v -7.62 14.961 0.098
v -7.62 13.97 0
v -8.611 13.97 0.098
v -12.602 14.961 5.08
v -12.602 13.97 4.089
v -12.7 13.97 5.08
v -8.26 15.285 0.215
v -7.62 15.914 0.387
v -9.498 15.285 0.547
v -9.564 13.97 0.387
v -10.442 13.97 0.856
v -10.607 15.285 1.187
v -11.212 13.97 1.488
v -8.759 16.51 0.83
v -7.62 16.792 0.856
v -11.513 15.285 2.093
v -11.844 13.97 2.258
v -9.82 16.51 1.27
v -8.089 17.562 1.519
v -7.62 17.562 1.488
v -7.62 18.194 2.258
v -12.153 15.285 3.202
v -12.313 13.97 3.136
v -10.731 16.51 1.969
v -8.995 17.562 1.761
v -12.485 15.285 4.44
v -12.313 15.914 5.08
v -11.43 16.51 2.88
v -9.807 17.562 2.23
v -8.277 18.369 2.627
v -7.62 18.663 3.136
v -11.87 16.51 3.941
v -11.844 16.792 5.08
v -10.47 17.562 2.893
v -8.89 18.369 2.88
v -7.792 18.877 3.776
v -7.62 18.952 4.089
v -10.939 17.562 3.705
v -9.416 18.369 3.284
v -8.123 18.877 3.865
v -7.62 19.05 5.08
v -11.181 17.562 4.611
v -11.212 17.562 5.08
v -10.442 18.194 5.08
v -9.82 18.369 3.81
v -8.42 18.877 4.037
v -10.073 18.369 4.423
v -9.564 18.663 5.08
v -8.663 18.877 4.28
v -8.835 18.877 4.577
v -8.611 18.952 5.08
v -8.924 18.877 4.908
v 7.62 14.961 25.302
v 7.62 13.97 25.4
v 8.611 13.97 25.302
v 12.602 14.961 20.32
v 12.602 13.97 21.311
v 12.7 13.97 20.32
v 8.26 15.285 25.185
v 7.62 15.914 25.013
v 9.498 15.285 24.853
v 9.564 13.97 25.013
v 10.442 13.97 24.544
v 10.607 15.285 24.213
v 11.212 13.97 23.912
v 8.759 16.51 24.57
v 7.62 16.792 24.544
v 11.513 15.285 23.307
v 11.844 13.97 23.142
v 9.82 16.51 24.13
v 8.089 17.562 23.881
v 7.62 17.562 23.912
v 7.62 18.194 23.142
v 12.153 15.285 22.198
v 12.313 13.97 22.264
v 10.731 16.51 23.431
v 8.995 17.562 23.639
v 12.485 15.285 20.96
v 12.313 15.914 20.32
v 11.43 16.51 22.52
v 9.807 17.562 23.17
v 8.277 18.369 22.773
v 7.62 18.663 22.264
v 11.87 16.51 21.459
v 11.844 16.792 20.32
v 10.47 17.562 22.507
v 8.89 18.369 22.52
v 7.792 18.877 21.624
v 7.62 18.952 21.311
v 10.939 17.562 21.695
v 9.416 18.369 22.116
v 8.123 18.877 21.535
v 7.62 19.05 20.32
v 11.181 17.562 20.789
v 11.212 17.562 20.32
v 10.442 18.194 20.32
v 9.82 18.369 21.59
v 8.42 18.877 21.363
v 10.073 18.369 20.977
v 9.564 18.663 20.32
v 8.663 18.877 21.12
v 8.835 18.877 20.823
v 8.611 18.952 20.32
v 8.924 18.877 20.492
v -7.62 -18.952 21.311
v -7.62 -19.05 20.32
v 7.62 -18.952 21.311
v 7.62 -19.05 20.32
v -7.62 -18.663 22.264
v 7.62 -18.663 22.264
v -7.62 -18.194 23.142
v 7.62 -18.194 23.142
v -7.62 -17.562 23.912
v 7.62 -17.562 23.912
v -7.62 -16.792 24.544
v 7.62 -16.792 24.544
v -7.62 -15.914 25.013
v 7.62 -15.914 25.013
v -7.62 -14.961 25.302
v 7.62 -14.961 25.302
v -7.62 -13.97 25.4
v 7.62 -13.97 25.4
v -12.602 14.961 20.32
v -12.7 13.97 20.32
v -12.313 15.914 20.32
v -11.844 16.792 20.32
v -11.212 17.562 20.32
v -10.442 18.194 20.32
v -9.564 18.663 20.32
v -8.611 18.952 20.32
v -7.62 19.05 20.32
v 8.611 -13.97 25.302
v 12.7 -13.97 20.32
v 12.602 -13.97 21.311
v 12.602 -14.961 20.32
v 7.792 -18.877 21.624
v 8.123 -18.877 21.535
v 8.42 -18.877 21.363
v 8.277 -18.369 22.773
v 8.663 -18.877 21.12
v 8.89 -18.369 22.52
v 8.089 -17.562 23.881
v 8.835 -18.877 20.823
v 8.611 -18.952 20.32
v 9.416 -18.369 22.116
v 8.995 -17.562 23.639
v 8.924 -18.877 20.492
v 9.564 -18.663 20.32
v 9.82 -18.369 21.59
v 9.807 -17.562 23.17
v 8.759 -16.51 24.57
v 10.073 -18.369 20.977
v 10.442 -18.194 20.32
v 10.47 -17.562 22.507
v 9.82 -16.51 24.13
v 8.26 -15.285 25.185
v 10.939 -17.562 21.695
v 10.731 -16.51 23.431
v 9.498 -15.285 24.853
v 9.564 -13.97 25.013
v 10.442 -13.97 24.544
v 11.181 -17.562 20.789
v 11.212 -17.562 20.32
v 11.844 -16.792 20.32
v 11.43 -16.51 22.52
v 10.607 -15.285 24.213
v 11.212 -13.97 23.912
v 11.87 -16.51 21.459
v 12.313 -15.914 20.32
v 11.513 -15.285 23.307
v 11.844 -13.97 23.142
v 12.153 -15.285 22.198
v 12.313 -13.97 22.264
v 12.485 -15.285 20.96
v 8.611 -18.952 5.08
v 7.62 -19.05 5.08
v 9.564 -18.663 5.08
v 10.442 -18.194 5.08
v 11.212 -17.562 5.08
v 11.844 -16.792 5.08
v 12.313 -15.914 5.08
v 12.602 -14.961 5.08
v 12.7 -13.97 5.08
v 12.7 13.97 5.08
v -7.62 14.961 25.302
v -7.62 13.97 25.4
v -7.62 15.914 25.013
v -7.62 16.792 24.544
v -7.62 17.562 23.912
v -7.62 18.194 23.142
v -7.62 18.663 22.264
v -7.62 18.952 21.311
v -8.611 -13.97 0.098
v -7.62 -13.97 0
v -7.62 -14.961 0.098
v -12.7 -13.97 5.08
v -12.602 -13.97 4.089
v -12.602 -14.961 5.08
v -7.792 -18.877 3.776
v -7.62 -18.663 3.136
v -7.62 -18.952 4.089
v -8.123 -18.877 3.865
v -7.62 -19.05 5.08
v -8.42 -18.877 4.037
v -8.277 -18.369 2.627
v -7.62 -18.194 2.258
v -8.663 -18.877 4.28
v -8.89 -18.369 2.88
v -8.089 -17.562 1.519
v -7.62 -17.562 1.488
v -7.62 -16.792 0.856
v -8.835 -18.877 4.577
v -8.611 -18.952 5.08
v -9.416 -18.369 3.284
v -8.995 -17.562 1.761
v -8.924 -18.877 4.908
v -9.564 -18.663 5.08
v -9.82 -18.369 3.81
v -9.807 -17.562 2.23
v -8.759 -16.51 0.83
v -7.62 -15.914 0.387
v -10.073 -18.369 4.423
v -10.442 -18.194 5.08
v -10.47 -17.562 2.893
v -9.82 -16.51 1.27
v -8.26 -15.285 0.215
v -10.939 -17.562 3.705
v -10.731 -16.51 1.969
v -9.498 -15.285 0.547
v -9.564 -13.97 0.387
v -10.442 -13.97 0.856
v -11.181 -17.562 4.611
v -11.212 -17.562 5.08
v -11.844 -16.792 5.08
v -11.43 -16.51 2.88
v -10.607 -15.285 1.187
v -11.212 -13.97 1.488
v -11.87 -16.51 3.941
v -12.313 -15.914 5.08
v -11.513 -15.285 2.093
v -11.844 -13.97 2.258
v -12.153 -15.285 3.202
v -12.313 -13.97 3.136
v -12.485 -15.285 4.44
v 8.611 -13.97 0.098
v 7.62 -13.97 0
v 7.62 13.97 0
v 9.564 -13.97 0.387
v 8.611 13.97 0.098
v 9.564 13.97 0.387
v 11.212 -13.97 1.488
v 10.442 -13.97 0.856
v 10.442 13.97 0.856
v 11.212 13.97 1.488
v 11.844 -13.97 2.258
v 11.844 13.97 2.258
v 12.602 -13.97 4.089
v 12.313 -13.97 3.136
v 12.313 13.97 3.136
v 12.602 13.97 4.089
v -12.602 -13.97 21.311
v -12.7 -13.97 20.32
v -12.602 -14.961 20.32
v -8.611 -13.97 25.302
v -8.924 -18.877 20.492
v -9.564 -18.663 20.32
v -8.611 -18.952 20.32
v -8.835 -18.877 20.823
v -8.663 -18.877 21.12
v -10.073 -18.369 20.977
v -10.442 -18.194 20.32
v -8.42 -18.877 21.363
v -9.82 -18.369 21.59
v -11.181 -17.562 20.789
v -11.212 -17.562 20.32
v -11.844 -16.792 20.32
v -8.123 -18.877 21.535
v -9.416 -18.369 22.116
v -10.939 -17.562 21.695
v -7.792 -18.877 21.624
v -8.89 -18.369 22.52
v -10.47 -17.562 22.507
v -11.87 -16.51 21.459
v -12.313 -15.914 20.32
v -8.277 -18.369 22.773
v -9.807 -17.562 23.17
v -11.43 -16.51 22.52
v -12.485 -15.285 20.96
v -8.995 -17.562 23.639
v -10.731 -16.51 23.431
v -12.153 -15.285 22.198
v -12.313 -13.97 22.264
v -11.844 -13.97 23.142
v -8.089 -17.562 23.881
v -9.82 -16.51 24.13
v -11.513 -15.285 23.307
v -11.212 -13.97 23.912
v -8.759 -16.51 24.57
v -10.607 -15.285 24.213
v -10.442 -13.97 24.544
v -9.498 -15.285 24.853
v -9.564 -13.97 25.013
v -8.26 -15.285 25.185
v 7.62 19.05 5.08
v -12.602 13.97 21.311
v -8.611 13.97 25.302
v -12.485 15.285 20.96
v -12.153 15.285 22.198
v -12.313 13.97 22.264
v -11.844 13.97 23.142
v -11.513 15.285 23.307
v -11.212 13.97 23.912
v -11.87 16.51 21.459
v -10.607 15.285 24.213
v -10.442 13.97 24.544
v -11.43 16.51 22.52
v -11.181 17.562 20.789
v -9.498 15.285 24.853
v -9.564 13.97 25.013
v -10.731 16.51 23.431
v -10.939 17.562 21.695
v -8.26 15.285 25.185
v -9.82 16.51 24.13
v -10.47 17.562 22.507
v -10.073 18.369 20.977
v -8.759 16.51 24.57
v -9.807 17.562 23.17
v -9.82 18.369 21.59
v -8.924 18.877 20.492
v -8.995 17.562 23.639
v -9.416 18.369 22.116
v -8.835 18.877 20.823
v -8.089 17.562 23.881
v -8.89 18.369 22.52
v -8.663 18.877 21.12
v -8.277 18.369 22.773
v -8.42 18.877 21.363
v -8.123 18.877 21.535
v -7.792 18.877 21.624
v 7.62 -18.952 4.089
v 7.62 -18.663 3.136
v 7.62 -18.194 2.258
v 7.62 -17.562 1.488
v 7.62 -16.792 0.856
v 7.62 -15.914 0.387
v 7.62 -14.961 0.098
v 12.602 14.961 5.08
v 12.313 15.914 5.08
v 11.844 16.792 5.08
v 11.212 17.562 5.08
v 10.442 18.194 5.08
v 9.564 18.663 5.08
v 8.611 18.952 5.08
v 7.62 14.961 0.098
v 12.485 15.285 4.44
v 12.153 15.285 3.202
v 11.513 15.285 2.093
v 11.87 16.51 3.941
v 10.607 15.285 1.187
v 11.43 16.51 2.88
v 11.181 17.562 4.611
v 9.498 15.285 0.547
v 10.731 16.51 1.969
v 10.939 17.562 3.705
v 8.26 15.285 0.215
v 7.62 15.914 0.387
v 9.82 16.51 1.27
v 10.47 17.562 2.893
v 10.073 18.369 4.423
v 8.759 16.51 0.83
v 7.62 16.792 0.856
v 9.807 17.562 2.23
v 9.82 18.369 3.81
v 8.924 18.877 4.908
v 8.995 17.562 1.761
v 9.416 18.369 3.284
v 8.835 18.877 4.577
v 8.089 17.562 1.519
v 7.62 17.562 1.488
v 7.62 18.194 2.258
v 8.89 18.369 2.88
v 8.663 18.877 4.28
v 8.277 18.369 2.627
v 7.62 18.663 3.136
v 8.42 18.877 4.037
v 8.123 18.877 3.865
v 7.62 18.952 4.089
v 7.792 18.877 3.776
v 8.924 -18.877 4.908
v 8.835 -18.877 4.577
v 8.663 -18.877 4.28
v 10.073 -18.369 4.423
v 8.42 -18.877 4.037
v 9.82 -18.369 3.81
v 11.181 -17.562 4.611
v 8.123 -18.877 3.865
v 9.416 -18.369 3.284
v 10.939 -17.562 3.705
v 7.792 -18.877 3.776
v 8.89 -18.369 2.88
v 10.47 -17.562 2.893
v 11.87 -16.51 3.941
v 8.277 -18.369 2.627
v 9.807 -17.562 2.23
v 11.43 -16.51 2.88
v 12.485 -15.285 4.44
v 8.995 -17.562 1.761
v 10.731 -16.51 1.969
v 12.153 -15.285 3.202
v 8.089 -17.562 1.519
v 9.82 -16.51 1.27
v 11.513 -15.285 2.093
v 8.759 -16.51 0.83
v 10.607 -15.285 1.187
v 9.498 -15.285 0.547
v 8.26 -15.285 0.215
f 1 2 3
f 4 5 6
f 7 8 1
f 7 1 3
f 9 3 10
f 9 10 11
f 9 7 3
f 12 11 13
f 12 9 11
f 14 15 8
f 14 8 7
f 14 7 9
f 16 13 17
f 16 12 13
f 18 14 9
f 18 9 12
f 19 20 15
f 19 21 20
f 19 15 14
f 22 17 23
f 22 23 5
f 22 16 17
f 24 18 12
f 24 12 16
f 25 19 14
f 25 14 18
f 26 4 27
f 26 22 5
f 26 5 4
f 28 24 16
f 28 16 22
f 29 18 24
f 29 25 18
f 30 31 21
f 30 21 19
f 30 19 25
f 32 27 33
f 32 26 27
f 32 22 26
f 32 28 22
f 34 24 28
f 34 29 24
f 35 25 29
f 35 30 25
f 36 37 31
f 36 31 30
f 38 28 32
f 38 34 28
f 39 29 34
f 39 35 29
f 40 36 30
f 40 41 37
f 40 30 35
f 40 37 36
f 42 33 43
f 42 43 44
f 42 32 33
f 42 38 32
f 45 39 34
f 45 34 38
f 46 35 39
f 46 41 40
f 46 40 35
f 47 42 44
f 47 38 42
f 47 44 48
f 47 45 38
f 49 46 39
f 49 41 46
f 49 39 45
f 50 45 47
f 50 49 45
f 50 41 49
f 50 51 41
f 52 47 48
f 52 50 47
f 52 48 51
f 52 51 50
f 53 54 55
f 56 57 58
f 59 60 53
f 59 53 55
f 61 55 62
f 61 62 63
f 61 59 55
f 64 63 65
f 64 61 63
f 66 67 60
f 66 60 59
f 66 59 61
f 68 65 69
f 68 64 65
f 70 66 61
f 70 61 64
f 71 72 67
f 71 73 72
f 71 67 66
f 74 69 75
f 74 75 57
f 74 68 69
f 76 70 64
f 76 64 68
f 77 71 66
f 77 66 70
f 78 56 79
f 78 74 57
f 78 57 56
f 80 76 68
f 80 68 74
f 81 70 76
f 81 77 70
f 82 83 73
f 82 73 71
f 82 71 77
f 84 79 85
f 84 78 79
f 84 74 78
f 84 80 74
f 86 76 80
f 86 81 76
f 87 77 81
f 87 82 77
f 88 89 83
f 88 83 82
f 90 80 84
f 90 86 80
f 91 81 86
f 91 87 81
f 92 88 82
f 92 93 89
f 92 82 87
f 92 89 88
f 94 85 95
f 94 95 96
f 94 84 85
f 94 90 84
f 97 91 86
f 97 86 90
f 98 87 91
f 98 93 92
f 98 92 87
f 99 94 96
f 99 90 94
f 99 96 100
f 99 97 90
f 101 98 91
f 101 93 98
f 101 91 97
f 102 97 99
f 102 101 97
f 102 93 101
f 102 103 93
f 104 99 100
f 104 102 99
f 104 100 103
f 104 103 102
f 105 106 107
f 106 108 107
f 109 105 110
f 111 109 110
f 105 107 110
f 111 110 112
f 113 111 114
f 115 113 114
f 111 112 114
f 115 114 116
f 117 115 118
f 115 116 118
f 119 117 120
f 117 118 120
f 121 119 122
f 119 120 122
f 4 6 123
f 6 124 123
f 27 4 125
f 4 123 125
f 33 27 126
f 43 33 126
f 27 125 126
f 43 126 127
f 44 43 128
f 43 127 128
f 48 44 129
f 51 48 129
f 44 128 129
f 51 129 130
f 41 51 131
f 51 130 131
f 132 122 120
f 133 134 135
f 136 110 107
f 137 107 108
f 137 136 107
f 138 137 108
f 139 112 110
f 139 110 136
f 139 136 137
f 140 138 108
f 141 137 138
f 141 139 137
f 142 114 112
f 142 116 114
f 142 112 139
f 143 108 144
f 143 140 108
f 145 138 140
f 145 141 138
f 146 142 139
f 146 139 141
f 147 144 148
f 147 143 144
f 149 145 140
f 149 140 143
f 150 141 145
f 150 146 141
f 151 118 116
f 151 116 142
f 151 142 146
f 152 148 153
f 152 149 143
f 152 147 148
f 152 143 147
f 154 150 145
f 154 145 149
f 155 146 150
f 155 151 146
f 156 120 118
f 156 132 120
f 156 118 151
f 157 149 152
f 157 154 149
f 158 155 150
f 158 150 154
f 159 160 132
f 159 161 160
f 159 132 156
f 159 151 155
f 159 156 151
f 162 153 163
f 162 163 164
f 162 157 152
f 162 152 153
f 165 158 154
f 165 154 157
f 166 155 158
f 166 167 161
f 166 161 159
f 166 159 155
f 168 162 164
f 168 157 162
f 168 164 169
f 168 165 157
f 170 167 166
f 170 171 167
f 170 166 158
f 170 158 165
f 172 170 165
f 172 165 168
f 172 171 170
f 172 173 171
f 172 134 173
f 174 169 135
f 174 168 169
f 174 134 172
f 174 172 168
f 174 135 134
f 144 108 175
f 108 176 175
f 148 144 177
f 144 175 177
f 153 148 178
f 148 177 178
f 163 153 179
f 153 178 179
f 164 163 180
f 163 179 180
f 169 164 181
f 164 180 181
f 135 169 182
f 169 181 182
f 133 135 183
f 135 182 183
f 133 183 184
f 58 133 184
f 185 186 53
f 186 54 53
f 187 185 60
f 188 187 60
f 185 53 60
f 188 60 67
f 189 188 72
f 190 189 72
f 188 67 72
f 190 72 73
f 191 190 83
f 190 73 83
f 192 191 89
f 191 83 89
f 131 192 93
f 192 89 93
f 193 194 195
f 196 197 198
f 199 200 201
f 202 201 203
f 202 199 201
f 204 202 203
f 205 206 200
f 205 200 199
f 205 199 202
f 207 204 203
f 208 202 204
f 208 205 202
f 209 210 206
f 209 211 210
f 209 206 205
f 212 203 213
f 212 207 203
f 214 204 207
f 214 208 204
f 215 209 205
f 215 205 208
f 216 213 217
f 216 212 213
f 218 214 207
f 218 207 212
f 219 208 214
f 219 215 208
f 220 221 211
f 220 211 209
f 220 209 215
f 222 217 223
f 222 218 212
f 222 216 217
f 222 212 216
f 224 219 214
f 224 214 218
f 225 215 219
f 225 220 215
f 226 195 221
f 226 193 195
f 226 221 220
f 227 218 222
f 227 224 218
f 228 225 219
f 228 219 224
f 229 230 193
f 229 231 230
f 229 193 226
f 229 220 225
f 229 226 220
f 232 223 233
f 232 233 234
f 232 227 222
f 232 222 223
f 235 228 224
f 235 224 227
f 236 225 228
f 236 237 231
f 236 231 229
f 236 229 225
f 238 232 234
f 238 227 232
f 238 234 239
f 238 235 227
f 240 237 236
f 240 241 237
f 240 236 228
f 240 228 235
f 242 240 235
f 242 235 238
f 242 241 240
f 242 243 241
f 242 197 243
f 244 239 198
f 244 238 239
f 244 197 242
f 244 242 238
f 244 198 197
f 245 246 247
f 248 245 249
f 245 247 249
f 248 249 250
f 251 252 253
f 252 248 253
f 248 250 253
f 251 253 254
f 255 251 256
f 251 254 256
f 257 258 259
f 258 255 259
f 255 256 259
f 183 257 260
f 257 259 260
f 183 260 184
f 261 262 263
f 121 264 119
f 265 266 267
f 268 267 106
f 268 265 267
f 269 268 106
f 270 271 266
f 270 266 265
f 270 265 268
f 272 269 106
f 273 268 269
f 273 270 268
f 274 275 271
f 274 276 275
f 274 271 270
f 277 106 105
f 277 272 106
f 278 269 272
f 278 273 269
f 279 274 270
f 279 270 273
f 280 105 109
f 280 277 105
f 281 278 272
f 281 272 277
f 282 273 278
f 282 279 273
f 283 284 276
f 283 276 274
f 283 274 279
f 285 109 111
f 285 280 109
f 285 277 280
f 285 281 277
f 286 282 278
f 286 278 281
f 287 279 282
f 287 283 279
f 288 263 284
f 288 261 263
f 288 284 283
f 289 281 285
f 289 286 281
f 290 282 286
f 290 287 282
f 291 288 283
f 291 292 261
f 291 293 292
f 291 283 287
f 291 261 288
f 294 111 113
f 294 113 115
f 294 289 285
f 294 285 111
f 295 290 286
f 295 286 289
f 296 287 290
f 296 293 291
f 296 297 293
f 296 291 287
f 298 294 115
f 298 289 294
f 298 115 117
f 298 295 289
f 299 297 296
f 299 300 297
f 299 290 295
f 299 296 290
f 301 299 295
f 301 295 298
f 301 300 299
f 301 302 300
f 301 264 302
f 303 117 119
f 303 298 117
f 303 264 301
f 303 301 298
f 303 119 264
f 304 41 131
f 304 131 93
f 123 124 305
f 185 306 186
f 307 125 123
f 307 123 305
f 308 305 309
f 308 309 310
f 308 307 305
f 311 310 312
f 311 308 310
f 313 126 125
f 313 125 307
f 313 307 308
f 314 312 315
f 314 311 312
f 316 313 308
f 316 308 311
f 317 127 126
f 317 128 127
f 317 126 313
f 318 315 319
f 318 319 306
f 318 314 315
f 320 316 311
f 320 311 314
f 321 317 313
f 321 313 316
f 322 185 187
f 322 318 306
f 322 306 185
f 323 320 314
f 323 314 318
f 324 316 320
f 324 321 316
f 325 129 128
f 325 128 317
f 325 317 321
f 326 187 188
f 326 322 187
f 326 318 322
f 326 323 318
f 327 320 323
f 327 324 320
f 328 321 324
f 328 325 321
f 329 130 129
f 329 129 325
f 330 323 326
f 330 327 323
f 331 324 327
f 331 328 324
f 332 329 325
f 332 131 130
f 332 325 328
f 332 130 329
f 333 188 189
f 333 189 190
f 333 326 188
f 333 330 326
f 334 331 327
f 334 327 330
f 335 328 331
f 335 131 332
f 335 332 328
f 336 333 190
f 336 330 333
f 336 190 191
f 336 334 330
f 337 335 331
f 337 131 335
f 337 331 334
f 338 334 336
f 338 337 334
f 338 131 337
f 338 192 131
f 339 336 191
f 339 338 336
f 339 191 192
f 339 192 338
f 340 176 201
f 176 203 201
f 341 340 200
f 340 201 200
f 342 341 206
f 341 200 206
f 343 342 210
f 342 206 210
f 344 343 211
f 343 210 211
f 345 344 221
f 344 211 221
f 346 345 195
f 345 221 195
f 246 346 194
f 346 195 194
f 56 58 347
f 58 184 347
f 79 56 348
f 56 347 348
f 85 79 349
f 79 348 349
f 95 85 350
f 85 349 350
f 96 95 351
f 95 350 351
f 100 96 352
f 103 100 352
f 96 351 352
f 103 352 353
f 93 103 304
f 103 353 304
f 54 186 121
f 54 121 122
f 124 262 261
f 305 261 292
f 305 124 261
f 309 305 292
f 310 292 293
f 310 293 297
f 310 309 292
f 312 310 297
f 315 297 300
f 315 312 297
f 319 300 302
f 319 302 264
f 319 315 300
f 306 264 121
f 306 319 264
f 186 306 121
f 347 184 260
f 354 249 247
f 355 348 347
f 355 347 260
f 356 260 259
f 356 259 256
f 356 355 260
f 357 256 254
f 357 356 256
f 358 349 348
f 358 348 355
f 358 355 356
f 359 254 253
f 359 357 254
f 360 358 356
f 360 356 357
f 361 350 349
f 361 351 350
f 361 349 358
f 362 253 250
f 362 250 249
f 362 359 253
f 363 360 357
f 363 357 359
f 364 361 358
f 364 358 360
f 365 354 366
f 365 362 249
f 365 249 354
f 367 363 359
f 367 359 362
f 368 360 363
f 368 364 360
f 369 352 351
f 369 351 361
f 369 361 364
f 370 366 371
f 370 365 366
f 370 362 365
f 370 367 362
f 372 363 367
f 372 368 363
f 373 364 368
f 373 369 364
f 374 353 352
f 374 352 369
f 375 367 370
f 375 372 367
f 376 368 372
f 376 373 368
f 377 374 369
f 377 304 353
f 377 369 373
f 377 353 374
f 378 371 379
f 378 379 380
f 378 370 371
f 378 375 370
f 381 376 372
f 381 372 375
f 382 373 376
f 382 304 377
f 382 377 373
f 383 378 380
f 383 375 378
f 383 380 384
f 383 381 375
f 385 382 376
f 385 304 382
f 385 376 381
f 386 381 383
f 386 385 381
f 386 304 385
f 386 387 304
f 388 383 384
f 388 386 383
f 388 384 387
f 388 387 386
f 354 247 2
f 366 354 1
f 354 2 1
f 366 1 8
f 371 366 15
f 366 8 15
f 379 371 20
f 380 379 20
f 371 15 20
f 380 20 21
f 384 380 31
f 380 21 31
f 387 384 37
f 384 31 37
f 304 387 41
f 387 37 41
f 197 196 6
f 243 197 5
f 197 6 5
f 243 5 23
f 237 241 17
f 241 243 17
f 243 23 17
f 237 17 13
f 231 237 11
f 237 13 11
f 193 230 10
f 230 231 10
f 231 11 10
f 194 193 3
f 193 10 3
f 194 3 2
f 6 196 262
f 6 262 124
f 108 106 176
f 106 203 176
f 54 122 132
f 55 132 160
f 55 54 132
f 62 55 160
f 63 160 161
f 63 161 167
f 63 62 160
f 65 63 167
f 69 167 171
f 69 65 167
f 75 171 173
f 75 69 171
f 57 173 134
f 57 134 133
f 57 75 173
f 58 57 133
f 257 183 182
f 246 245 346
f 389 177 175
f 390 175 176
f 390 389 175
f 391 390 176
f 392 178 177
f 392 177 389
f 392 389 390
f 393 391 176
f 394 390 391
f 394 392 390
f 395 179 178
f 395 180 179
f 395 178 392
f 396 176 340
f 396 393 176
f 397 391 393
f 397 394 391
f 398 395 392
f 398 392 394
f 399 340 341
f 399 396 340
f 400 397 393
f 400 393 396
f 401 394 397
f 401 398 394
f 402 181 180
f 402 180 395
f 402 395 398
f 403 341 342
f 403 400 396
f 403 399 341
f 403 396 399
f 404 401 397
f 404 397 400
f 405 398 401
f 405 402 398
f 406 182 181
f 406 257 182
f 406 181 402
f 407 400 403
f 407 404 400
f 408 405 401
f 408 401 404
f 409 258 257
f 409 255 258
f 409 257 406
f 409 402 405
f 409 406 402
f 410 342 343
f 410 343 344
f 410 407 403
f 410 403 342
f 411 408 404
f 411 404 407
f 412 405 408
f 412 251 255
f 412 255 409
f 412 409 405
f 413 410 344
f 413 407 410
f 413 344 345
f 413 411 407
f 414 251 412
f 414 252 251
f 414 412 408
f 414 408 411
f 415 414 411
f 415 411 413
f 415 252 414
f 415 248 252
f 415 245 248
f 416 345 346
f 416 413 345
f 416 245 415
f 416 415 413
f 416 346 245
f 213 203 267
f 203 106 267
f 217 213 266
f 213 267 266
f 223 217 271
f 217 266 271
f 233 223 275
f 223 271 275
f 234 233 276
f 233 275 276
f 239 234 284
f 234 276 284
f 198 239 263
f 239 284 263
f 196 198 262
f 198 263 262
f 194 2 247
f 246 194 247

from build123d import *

# Parameters (mm, degrees)
F0_W     = 25.4
F0_H     = 38.1
F1_DEPTH = 25.4
F2_DEPTH = 25.4
F3_R     = 5.08
F4_R     = 5.08


with BuildPart() as f1:
    # F0 (on Top) → F1 (new body)
    with BuildSketch(Plane.XY):
        Rectangle(F0_W, F0_H)
    extrude(amount=F1_DEPTH)

    # F0 (on Top) → F2 (join)
    with BuildSketch(Plane.XY):
        Rectangle(F0_W, F0_H)
    extrude(amount=F2_DEPTH)

    # F3
    f3_edges = [f1.edges().sort_by_distance(p)[0] for p in [
        (-12.7, 0, 25.4),
        (12.7, 0, 25.4),
        (-12.7, 0, 0),
        (12.7, 0, 0),
    ]]
    fillet(f3_edges, radius=F3_R)

    # F4
    f4_edges = [f1.edges().sort_by_distance(p)[0] for p in [
        (0, -19.05, 25.4),
        (-12.7, -19.05, 12.7),
        (12.7, -19.05, 12.7),
        (-12.7, 19.05, 12.7),
        (12.7, 19.05, 12.7),
    ]]
    fillet(f4_edges, radius=F4_R)


solid = f1.part
